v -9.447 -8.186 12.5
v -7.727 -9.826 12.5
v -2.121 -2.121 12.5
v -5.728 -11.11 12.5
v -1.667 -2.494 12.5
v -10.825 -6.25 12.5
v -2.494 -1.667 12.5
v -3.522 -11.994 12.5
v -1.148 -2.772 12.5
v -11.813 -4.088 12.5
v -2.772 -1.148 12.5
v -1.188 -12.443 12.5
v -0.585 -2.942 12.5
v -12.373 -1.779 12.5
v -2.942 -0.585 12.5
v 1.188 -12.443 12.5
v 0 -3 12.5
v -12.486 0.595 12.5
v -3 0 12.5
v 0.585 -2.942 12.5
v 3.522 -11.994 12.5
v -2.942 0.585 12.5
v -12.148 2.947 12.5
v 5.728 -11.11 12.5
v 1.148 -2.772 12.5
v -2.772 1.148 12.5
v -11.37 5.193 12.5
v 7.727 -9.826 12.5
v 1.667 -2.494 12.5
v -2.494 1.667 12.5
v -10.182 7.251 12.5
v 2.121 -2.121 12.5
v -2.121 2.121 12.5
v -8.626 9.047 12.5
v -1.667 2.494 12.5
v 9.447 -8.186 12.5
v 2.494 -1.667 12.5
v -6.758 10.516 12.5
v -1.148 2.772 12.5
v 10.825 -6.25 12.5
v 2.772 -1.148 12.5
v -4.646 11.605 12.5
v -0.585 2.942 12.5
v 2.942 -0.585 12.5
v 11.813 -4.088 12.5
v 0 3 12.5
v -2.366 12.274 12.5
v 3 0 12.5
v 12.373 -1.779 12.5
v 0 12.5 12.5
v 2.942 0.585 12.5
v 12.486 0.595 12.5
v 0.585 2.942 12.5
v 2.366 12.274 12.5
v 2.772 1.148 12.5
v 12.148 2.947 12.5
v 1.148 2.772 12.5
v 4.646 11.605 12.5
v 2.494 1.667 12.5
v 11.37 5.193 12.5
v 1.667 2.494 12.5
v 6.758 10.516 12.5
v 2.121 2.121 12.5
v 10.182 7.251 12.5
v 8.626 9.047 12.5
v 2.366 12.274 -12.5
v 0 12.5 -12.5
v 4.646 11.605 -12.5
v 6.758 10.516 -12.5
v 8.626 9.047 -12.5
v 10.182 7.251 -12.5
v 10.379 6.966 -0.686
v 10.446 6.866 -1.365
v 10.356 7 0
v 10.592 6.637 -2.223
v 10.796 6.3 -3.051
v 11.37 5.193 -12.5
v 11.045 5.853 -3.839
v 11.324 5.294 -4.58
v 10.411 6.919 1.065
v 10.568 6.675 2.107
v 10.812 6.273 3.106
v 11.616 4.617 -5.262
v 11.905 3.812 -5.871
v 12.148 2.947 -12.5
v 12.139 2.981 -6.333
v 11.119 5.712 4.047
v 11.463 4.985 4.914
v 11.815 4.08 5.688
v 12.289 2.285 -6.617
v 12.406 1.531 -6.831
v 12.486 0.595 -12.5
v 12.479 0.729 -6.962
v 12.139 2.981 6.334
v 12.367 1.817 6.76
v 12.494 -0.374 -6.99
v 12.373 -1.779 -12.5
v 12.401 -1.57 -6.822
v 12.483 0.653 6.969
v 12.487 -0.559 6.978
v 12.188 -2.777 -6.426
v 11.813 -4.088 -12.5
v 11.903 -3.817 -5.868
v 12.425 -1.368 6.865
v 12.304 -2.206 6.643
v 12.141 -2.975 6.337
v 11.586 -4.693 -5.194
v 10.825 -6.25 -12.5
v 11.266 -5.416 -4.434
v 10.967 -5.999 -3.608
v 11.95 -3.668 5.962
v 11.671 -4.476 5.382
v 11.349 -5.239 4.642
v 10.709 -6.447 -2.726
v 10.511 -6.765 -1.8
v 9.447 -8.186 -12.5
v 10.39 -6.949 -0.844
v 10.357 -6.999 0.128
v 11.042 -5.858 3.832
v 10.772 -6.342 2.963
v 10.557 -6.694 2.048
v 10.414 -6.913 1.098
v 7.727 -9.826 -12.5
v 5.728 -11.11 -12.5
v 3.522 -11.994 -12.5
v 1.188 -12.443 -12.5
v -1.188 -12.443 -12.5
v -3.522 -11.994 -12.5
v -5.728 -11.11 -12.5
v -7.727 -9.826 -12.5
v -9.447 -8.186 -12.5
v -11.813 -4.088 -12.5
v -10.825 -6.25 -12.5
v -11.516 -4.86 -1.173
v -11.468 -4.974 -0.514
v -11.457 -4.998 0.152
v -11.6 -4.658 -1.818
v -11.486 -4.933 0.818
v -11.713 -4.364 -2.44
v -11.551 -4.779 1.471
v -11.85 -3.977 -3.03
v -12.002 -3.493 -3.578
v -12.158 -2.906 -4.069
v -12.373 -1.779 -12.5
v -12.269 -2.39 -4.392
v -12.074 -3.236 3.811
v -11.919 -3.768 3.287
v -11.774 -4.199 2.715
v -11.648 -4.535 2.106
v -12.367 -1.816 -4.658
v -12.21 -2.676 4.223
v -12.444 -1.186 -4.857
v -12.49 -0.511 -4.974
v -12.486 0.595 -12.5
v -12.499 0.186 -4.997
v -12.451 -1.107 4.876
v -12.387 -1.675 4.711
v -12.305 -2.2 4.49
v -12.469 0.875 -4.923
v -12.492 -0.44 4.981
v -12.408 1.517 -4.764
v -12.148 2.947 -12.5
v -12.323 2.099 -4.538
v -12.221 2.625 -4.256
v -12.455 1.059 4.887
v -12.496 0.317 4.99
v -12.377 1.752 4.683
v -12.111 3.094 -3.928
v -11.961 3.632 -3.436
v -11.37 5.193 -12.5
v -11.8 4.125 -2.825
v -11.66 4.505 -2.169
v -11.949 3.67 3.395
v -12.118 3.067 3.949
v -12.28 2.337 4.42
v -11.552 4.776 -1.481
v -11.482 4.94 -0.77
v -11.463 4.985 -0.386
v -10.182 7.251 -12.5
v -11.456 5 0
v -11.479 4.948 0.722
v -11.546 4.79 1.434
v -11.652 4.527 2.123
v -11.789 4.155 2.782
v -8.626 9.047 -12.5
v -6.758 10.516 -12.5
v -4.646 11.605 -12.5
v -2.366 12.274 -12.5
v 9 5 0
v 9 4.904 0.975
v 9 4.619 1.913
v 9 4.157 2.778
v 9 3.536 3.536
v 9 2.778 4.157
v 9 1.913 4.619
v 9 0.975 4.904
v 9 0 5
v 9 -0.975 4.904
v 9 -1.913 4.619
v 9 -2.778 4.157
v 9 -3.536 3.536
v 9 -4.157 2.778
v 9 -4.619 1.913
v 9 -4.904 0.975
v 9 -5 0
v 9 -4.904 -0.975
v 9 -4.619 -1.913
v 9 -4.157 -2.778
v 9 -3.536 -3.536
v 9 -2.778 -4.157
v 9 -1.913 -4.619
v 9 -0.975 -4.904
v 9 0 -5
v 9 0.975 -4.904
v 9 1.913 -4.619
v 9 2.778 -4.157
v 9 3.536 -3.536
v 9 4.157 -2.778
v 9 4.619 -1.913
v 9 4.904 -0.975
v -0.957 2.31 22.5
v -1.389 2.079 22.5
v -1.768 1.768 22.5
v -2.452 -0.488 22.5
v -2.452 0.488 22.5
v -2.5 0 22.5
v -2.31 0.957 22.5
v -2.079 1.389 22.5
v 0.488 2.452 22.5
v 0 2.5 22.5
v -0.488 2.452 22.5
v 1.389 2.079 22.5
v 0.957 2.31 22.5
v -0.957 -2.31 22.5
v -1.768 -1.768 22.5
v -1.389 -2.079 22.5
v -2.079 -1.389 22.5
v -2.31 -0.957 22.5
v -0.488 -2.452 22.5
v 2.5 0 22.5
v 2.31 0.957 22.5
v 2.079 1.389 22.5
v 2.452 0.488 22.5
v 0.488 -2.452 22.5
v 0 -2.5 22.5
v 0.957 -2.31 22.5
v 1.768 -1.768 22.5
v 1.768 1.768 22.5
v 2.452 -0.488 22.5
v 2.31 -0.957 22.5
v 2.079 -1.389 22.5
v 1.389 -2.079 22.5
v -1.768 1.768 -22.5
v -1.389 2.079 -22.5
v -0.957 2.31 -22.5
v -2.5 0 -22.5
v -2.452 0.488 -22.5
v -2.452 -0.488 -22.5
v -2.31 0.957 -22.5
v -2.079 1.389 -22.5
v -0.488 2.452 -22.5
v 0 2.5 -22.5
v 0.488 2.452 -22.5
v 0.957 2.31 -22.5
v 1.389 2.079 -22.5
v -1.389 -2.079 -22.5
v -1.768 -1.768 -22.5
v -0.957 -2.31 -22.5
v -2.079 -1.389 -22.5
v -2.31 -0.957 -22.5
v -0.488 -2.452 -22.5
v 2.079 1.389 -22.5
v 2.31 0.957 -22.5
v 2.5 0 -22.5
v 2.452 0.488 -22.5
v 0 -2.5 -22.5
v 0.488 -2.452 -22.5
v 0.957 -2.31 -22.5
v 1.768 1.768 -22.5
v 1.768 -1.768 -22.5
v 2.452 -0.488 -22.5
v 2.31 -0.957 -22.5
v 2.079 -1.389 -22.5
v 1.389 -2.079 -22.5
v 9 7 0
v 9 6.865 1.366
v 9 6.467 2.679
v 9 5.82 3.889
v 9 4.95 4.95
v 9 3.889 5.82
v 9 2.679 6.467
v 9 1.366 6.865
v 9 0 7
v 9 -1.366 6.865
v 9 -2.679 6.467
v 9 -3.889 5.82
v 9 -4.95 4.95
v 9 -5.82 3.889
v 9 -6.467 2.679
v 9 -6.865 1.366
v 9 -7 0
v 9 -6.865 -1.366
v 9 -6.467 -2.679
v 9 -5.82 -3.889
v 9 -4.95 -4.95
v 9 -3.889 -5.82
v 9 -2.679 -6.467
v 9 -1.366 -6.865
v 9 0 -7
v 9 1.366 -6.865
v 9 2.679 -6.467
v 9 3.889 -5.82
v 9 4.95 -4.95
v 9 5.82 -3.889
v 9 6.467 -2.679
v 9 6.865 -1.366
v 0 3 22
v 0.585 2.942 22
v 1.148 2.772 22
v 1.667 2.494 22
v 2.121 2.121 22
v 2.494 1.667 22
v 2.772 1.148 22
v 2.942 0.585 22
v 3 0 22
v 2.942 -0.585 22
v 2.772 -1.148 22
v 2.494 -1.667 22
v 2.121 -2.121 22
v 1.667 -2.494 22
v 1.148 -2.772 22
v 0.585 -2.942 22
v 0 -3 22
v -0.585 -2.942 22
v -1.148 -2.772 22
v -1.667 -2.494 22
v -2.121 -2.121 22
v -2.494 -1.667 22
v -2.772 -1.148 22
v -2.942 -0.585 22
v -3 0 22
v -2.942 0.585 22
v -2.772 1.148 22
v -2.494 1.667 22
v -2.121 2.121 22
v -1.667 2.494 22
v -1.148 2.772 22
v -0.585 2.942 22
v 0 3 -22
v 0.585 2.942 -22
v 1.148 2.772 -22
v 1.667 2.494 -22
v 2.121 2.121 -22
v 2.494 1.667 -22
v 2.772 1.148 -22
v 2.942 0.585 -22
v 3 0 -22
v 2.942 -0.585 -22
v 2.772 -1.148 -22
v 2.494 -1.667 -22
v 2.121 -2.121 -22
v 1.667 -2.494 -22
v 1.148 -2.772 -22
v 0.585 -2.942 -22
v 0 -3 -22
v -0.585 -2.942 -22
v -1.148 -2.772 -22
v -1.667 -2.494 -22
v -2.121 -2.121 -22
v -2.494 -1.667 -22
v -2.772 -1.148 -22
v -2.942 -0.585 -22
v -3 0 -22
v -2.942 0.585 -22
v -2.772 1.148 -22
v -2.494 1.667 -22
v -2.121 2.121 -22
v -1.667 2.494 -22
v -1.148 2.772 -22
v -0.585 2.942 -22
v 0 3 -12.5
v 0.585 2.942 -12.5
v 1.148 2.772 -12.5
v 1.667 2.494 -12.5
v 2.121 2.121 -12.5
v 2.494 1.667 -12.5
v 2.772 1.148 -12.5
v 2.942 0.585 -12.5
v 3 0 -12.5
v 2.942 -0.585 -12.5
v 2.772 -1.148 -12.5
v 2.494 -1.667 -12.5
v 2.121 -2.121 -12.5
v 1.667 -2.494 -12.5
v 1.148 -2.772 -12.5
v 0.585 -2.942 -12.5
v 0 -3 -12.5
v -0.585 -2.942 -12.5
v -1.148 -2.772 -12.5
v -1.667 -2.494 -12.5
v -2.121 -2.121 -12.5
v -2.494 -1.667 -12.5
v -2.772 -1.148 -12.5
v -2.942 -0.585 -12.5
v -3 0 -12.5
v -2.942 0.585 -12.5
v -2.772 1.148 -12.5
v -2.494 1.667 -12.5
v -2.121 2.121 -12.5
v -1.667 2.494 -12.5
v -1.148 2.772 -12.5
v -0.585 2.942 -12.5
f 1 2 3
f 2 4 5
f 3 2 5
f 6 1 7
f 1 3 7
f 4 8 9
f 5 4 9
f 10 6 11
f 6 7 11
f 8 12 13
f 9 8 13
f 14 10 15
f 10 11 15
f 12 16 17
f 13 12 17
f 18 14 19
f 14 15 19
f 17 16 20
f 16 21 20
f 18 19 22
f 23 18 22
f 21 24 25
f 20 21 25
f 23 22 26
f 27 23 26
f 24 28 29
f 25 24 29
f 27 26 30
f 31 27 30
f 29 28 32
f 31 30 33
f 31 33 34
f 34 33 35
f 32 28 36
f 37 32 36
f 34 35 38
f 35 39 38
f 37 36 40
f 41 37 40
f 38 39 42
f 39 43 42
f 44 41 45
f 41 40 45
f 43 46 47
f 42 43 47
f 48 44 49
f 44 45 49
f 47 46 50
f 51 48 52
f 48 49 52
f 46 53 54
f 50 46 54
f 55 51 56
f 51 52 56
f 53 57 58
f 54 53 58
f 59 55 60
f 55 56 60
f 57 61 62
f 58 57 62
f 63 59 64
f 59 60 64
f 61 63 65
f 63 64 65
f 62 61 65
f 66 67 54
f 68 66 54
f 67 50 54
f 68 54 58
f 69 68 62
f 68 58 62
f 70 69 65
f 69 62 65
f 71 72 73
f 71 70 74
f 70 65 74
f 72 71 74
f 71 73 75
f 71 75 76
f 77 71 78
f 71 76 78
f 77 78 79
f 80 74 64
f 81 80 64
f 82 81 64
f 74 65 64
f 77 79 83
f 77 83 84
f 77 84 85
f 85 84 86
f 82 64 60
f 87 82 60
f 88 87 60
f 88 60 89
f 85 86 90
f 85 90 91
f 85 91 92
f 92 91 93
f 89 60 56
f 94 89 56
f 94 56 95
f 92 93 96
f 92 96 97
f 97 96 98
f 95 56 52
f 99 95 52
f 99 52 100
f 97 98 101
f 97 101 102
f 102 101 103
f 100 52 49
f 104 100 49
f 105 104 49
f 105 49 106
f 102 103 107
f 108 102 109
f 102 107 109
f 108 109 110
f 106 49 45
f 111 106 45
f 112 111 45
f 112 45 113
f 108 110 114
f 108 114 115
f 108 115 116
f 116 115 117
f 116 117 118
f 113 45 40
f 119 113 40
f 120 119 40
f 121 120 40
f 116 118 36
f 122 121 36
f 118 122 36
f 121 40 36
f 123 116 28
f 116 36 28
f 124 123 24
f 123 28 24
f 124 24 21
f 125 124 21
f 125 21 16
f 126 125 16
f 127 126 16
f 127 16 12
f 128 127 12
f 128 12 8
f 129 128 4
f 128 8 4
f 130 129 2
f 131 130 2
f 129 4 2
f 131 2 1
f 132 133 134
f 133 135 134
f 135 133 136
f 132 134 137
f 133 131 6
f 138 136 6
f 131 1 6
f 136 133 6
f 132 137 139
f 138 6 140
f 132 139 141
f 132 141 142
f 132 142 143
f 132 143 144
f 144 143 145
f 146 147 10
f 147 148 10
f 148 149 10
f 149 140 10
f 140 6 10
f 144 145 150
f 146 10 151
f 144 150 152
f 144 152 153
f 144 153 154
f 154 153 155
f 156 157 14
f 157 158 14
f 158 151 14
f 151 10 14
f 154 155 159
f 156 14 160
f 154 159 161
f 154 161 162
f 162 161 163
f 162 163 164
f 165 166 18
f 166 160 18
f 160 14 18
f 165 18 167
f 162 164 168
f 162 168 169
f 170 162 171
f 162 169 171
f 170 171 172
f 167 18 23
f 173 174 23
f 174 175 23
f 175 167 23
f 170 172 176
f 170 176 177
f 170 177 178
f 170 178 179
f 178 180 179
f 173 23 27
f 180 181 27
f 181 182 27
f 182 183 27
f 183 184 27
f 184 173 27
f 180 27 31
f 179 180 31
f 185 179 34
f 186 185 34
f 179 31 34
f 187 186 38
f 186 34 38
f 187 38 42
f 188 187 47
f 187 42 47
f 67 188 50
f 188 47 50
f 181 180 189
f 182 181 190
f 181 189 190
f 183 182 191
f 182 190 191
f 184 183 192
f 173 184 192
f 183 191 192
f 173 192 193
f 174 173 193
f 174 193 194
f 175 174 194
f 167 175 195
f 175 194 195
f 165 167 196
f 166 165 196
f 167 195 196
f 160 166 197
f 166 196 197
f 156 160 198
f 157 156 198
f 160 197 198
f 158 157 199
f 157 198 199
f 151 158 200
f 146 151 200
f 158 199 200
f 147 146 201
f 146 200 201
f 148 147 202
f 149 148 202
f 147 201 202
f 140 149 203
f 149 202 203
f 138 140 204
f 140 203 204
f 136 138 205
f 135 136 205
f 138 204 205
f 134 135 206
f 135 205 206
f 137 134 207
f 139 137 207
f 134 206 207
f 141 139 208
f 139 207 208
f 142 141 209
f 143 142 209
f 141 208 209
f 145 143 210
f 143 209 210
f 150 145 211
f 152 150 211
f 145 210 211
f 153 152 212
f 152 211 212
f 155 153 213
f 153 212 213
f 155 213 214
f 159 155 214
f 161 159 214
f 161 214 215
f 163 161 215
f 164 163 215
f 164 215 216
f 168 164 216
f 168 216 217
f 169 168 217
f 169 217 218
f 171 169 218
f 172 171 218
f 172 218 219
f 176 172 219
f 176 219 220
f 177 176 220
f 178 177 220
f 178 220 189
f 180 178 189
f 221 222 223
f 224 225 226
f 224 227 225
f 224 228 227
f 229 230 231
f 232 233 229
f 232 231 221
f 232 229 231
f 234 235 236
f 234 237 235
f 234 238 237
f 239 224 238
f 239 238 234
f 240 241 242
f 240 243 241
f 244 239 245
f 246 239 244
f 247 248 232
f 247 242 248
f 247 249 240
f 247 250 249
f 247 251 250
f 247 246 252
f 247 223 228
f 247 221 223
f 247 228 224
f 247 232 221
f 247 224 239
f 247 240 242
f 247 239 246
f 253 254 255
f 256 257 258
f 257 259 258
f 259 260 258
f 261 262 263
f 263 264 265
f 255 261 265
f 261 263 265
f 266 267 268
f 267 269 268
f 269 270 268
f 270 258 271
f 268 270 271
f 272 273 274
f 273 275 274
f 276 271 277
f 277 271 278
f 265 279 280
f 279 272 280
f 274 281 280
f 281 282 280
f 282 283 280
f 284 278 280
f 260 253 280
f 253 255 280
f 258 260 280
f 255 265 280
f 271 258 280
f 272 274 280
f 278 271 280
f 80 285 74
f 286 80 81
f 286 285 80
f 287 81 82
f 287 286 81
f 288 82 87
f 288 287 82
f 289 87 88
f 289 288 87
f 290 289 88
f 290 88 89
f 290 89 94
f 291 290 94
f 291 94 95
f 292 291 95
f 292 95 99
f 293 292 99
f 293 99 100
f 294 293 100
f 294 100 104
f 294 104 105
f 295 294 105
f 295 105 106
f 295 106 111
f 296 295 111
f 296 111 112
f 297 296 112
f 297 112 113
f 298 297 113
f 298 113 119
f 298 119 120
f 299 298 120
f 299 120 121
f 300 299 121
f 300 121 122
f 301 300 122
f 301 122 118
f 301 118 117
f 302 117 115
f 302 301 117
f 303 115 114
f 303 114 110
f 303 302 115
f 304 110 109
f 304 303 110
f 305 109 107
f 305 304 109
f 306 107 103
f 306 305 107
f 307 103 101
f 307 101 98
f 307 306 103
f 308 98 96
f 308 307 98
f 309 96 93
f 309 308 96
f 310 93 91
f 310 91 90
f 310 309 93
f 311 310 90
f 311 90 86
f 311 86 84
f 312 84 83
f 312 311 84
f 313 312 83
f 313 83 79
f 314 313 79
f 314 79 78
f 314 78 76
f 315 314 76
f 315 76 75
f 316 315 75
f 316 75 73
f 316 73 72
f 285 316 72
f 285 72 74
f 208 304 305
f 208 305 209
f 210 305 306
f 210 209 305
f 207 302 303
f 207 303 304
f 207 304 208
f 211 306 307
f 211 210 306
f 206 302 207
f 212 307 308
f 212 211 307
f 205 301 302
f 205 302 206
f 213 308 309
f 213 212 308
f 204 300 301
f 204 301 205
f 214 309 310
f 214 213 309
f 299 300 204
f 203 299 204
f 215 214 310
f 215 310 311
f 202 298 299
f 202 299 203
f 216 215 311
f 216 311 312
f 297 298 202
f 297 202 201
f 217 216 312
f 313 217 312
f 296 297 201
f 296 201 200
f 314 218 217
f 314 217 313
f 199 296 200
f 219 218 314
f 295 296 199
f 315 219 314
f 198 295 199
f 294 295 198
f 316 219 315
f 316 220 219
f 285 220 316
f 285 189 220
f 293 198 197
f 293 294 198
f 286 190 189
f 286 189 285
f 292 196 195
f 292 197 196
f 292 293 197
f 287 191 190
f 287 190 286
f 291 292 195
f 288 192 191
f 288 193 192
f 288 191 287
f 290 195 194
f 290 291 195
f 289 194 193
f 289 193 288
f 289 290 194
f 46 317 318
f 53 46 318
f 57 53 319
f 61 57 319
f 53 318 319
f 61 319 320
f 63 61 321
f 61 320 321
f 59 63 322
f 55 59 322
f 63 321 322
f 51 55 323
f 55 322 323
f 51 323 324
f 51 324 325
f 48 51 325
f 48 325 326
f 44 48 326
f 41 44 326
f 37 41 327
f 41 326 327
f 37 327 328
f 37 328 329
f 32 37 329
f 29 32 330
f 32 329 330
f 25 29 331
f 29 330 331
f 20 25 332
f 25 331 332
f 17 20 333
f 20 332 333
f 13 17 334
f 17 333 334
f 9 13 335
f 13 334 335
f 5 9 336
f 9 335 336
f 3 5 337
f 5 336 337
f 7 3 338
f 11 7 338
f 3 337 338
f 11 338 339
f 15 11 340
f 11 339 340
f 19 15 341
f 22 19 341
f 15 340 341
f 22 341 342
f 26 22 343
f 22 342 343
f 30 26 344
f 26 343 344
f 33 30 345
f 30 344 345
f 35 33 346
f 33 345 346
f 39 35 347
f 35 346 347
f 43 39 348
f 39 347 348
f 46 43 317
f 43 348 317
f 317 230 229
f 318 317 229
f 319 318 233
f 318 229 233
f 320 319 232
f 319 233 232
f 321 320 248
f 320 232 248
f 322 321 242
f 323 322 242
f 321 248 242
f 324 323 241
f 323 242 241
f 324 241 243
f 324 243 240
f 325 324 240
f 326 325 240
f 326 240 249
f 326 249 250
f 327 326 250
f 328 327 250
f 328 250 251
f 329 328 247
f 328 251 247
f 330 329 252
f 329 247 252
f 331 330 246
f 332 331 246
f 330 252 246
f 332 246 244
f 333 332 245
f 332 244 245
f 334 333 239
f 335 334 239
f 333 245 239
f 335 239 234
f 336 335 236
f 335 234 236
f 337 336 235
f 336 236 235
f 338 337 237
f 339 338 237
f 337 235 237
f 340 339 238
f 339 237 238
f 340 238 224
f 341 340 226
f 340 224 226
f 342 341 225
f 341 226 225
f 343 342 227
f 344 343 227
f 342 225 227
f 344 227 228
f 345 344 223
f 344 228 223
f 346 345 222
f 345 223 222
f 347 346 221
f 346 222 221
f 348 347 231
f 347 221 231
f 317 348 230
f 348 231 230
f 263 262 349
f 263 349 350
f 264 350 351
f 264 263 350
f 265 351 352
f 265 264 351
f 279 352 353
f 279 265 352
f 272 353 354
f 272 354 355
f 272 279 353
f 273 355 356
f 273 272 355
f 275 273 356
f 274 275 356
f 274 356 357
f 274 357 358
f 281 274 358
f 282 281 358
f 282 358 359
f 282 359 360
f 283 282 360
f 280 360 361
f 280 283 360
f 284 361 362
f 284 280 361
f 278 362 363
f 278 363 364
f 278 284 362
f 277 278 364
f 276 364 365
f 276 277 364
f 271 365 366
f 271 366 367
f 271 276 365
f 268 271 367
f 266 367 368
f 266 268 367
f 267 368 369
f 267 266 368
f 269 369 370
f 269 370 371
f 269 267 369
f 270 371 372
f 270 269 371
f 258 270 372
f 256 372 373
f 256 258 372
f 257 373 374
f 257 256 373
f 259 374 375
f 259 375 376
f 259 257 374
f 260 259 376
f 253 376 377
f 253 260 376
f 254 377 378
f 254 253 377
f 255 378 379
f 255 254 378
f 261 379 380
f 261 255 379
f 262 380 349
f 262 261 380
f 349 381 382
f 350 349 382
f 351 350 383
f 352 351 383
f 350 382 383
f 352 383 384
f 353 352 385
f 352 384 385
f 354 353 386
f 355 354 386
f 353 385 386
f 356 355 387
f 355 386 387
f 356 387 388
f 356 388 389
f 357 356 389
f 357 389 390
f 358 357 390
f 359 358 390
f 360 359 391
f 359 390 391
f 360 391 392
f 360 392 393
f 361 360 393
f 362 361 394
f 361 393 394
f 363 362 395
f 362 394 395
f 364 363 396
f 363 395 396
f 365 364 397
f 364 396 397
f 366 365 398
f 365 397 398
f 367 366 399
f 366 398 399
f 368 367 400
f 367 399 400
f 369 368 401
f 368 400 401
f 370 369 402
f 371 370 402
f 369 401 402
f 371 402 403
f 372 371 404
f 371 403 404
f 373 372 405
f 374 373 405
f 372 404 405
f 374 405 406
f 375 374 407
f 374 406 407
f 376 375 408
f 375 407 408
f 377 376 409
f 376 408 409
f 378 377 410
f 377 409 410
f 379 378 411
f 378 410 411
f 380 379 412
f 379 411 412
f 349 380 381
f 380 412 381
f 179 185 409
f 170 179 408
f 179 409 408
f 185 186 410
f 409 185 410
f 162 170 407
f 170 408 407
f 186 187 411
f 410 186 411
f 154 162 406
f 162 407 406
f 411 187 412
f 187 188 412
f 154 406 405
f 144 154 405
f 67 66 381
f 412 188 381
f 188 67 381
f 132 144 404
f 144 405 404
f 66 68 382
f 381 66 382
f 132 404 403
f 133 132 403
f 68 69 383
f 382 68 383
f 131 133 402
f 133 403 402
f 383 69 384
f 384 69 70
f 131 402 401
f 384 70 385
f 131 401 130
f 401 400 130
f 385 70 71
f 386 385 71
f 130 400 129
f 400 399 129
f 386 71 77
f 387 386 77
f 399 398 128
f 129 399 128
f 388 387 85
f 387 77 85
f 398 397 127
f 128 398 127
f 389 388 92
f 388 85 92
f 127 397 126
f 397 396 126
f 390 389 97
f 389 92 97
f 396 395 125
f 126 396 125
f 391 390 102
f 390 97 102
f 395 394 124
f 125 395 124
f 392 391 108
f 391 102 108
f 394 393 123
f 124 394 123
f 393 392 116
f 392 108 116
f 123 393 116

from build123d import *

# Parameters (mm, degrees)
F0_W     = 3
F0_H     = 10
F2_R     = 5
F3_DEPTH = 12.5
F5_START = 9
F4_R     = 7
F5_DEPTH = 5
F6_SIZE  = 0.5


with BuildPart() as f1:
    # F0 (on Right) → F1 (revolve)
    with BuildSketch(Plane.YZ):
        Polygon((3, 12.5), (0, 12.5), (0, -12.5), (3, -12.5), (12.5, -12.5), (12.5, -5), (12.5, 5), (12.5, 12.5), align=None)
        with Locations((1.5, 17.5)):
            Rectangle(F0_W, F0_H)
        with Locations((1.5, -17.5)):
            Rectangle(F0_W, F0_H)
    revolve(axis=Axis((0, 0, 0), (0, 0, -1)))

    # F2 (on Right) → F3 (cut, symmetric)
    with BuildSketch(Plane.YZ):
        Circle(F2_R)
    extrude(amount=F3_DEPTH, both=True, mode=Mode.SUBTRACT)

    # F4 (on Right) → F5 (cut)
    with BuildSketch(Plane.YZ.offset(F5_START)):
        Circle(F4_R)
    extrude(amount=F5_DEPTH, mode=Mode.SUBTRACT)

    # F6
    f6_edges = [f1.edges().sort_by_distance(p)[0] for p in [
        (0, -3, 22.5),
        (0, -3, -22.5),
    ]]
    chamfer(f6_edges, length=F6_SIZE)


solid = f1.part
